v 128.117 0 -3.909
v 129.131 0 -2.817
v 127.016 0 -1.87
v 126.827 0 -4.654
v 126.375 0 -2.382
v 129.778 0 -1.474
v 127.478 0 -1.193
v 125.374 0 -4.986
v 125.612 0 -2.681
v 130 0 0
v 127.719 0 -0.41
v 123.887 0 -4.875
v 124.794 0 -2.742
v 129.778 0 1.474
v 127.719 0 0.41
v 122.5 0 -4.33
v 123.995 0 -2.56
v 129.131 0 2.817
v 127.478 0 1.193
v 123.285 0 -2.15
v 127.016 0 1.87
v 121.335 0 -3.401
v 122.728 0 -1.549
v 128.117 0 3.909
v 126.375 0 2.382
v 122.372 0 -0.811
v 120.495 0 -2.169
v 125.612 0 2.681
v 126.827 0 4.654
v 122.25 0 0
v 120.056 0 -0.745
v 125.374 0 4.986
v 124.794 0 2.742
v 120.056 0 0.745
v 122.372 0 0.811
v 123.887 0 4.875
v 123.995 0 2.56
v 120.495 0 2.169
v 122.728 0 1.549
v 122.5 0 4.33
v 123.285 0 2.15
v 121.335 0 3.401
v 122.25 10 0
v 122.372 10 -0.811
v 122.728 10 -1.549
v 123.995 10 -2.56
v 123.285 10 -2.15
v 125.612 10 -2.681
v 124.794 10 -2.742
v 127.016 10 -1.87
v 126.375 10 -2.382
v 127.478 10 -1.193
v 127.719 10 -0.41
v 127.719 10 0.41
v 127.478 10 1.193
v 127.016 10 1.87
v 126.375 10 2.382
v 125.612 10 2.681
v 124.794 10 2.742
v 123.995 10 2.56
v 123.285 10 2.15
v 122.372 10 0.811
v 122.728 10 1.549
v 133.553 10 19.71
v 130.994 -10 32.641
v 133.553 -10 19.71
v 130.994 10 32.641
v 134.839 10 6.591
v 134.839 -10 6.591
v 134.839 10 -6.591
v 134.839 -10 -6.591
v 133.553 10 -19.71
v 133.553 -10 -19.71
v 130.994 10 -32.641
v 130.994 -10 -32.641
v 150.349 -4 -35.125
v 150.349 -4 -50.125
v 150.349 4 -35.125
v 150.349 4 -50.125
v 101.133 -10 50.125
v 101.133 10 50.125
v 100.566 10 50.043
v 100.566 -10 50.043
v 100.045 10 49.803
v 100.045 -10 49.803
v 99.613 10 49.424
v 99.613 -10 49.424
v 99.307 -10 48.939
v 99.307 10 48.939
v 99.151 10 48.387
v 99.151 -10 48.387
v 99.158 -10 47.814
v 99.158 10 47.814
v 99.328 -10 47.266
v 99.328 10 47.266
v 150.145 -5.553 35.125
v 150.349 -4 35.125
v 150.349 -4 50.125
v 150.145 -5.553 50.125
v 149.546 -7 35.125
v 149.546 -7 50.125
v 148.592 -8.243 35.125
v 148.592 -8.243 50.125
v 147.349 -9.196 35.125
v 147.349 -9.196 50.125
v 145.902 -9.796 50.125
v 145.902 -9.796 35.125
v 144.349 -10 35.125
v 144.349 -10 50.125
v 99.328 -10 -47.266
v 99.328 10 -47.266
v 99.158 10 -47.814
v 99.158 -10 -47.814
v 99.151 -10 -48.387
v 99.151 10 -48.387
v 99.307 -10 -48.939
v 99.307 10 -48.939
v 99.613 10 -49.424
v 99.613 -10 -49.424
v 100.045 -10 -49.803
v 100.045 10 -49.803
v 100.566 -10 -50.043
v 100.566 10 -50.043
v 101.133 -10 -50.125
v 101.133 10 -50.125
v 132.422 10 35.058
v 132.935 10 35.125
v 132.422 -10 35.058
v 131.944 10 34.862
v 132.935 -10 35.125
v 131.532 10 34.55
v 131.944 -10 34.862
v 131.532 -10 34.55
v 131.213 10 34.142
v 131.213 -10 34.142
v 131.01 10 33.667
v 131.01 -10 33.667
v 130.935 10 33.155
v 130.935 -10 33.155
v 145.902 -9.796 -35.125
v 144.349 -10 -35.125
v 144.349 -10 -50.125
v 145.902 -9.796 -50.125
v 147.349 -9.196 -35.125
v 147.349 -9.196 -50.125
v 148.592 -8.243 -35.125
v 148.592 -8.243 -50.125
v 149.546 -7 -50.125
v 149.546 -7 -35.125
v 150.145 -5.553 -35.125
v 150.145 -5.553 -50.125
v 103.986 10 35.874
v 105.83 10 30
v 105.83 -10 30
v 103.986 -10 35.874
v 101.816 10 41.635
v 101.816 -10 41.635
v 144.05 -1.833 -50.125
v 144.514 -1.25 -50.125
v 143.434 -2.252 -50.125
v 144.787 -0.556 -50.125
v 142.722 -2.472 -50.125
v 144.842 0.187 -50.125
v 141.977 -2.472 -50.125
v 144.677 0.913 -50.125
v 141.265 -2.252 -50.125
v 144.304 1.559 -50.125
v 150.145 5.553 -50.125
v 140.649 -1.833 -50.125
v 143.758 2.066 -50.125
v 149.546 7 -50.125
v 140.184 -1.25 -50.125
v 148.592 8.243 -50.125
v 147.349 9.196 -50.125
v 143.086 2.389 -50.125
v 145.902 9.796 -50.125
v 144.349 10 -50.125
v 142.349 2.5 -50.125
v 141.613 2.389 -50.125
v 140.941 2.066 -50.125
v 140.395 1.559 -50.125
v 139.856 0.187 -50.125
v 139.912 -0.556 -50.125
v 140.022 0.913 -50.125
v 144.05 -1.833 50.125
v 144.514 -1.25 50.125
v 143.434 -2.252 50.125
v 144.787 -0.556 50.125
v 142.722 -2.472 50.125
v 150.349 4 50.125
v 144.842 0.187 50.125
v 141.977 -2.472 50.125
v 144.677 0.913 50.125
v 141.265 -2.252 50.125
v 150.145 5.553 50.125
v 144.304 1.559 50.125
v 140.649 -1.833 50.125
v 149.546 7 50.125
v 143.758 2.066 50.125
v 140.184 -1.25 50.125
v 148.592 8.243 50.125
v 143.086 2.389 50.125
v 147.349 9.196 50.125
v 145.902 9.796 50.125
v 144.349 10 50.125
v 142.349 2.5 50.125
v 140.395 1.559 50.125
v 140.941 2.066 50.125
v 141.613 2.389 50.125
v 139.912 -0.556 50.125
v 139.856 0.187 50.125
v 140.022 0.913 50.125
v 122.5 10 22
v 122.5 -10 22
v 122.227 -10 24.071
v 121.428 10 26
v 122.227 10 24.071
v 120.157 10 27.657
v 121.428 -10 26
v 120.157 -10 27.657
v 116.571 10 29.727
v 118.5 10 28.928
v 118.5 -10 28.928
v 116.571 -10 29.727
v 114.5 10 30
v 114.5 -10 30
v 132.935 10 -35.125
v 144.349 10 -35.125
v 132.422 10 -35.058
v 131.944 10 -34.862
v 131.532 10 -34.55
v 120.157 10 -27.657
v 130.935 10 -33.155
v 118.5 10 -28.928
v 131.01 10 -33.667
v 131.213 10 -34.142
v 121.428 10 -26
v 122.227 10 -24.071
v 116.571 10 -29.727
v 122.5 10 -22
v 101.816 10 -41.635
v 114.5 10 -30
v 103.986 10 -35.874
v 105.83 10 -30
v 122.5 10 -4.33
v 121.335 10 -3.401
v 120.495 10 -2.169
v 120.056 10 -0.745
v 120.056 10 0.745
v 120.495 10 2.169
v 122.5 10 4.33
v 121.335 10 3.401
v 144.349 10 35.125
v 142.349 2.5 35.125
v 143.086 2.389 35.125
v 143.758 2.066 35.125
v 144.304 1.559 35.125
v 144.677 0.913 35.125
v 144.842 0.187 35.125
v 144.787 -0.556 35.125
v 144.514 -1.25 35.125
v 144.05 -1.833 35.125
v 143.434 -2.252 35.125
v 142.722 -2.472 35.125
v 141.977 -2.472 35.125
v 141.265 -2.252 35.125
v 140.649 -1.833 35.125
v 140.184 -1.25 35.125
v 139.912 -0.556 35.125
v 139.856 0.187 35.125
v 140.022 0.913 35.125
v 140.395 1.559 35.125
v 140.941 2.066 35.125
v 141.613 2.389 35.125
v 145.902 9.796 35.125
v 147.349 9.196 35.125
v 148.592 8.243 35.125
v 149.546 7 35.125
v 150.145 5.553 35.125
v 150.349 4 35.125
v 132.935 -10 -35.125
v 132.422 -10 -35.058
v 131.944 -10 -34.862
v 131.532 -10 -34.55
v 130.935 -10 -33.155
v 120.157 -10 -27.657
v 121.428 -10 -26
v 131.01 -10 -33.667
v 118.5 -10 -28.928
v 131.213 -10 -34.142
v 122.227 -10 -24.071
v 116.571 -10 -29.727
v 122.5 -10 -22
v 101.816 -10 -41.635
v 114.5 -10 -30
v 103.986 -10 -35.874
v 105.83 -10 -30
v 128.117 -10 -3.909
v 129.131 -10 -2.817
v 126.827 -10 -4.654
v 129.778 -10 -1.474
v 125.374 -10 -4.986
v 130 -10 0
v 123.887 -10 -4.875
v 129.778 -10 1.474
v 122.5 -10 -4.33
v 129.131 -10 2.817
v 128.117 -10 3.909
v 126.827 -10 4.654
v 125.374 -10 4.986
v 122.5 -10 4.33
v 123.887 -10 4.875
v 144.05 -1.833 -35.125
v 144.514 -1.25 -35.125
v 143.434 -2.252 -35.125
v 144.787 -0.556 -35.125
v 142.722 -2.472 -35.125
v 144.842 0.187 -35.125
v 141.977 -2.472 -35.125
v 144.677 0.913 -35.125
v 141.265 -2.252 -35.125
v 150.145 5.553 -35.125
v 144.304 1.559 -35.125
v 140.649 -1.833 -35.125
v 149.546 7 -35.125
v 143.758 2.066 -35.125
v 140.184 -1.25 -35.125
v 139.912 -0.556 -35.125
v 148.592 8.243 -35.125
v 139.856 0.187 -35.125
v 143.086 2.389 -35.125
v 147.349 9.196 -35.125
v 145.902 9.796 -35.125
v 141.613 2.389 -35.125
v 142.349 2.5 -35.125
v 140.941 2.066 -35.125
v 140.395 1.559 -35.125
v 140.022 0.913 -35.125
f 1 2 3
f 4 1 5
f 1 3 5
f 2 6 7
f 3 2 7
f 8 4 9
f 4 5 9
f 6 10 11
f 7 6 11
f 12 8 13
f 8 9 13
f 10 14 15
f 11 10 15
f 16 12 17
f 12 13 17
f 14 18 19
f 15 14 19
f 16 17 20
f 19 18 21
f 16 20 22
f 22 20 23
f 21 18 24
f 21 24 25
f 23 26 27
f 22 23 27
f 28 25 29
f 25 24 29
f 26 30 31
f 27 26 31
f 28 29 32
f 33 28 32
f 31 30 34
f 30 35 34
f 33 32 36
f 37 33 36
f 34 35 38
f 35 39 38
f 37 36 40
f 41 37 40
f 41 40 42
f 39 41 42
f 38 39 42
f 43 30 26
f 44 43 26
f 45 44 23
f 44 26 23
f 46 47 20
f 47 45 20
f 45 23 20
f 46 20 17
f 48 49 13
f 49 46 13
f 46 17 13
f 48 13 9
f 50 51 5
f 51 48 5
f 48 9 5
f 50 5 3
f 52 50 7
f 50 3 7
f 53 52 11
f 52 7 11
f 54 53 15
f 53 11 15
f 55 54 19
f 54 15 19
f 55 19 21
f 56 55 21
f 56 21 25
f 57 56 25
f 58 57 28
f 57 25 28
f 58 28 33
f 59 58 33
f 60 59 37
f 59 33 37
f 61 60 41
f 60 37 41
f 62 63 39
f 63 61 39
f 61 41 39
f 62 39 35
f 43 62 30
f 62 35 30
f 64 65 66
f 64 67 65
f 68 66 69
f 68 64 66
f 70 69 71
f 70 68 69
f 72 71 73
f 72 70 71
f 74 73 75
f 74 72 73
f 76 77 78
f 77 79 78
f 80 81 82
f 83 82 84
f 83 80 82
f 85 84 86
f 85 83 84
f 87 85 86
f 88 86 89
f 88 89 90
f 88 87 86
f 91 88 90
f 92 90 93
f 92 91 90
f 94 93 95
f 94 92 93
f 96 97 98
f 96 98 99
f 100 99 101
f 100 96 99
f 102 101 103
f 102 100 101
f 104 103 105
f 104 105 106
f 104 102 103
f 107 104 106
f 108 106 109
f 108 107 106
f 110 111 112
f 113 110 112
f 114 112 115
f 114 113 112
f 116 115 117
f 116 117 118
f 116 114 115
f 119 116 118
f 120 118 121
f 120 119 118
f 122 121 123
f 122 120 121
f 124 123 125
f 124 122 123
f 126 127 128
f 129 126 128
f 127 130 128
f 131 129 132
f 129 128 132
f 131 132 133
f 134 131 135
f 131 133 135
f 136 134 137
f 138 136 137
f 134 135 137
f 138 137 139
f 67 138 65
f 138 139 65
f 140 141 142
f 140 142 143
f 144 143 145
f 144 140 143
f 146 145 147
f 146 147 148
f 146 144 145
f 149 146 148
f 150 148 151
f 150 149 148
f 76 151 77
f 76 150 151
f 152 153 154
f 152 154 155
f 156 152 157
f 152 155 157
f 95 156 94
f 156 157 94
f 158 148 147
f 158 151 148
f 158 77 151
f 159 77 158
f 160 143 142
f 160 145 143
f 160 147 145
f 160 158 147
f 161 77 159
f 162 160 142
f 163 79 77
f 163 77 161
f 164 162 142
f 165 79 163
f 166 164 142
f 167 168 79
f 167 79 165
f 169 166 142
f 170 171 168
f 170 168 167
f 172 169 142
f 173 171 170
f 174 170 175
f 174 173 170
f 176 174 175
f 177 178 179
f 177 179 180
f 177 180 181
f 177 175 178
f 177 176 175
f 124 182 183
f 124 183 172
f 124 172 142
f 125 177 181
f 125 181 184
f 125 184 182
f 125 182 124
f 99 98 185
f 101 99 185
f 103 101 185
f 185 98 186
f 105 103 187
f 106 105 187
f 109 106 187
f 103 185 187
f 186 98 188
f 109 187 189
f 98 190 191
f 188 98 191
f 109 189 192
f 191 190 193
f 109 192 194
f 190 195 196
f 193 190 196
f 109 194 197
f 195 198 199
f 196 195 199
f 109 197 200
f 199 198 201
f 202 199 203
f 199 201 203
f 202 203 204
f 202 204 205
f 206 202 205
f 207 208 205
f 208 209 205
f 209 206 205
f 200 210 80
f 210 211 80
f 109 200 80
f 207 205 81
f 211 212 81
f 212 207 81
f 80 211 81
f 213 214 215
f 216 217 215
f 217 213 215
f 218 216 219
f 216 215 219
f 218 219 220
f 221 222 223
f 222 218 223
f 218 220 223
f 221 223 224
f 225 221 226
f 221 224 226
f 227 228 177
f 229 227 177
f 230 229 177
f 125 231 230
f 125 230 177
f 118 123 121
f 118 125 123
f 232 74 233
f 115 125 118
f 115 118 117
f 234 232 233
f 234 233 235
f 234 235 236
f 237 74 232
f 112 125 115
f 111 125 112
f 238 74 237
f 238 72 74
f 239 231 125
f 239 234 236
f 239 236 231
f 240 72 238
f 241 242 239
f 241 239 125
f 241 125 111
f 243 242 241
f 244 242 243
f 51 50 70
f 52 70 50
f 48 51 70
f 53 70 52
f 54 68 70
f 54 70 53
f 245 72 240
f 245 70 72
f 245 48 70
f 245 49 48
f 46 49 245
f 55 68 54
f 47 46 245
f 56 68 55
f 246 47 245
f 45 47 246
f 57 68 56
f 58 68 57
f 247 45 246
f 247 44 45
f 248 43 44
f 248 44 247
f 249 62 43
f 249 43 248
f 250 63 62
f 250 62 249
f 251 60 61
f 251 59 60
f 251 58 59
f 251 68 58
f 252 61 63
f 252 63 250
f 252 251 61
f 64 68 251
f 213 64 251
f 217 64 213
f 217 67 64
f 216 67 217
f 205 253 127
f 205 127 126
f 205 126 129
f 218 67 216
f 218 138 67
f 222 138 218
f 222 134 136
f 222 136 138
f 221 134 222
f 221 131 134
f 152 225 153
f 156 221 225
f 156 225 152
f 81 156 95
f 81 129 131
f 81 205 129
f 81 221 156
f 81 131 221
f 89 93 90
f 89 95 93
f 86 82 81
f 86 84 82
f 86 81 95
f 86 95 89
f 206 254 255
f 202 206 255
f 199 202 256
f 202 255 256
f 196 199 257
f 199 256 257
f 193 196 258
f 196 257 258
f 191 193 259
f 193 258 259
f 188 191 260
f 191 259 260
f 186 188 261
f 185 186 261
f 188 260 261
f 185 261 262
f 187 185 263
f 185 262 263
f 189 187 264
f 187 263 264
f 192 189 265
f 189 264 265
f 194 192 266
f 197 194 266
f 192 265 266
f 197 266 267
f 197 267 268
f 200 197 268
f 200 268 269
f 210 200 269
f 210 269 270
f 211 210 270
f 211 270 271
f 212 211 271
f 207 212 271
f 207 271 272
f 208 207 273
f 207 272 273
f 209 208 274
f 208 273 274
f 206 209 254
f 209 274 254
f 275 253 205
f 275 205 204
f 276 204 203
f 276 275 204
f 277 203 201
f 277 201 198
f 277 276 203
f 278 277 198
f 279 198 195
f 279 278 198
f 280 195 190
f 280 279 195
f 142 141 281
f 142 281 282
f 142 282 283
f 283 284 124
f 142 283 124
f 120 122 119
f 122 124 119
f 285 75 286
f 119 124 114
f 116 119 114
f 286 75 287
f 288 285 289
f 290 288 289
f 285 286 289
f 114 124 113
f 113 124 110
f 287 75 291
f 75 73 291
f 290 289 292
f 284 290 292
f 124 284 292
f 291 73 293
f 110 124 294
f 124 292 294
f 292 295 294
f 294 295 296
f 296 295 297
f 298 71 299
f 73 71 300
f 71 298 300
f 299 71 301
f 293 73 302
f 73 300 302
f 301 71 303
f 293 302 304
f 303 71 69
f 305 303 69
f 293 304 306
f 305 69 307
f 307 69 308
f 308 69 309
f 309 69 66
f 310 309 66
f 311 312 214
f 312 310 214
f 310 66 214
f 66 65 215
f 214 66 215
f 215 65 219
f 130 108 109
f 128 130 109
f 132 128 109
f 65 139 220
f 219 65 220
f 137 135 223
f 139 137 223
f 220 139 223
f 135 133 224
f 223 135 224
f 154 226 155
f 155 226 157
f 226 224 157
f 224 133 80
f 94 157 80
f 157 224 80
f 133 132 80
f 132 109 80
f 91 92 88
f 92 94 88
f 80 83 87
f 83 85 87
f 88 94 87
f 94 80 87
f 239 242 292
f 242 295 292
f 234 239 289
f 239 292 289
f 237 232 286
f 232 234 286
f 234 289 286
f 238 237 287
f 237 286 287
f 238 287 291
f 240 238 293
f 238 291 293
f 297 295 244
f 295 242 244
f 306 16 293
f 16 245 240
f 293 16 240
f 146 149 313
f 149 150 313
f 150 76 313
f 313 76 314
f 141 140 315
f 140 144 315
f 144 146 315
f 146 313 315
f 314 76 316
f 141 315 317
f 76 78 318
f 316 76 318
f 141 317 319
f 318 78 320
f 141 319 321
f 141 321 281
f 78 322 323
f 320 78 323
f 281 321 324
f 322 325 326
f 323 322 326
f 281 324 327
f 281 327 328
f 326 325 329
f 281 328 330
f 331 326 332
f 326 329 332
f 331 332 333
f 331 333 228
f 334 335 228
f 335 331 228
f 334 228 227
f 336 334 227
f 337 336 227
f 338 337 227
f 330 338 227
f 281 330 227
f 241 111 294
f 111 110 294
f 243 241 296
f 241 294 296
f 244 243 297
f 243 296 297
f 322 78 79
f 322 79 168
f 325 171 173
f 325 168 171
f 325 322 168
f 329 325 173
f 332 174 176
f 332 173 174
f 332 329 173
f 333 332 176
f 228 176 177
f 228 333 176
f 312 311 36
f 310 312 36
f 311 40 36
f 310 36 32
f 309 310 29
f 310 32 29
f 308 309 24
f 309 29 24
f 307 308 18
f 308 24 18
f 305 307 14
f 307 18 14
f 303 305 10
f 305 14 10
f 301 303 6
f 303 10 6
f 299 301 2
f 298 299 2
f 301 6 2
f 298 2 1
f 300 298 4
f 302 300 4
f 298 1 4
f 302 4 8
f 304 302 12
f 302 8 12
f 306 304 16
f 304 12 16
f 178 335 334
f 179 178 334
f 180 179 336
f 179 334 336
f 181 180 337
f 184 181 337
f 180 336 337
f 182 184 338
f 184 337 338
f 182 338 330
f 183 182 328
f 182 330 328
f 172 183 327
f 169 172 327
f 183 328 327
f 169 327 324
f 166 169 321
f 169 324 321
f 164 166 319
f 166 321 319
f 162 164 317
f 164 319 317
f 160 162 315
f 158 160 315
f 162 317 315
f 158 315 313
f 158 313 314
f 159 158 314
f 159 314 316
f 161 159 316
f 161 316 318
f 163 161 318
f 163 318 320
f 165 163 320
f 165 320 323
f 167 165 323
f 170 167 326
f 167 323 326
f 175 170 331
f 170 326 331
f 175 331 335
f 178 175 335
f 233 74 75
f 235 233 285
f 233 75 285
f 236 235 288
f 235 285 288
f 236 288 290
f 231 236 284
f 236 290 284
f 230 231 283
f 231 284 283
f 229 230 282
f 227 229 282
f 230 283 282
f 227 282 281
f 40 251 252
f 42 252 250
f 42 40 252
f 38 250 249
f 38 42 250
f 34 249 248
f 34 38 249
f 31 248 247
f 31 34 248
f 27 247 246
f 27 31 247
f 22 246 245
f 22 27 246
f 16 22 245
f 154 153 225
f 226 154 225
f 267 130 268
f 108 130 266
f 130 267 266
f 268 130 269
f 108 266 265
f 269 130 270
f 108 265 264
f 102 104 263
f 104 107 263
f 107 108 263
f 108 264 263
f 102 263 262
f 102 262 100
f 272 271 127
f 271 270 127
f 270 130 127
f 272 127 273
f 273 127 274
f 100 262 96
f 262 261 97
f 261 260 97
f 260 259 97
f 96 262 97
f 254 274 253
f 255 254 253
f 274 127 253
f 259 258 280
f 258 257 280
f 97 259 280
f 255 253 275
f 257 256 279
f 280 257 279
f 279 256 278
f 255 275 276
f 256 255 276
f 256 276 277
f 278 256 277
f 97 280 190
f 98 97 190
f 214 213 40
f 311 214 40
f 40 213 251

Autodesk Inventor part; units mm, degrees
ref_plane "YZ Plane" through (0, 0, 0) normal (1, 0, 0) x (0, 1, 0)
ref_plane "XZ Plane" through (0, 0, 0) normal (0, 1, 0) x (-1, 0, 0)
ref_plane "XY Plane" through (0, 0, 0) normal (0, 0, 1) x (1, 0, 0)
sketch "Sketch1" plane through (0, 0, 0) normal (0, 1, 0) x (-1, 0, 0)
  circle A0 centre (0, 0) radius 135
  circle A1 centre (0, 0) radius 110
  line L0 (0, 0) -> (-125, 0)
  line L1 (0, 0) -> (125, 0) construction
  circle A2 centre (-125, 0) radius 2.75
  circle A3 centre (-125, 0) radius 5
  dimension "d0" = 270
  dimension "d1" = 220
  dimension "d82" = 125
  dimension "d83" = 180
  dimension "d84" = 5.5
  dimension "d85" = 10
extrude "Extrusion1" add sketch "Sketch1" along normal mid plane 20 contours A0 | A2 | A3
sketch "Sketch4" plane through (0, 10, 0) normal (0, 1, 0) x (1, 0, 0)
  circle A0 centre (0, 0) radius 50.125
  circle A1 centre (0, 0) radius 135 projected
  circle A2 centre (0, 0) radius 110 projected
  line L0 (125.3494, 50.125) -> (150.3494, 50.125)
  line L1 (150.3494, 50.125) -> (150.3494, 35.125)
  line L2 (150.3494, 35.125) -> (125.3494, 35.125)
  line L3 (125.3494, 35.125) -> (125.3494, 50.125)
  line L4 (150.3494, 70.125) -> (104.7795, 70.125)
  line L5 (104.7795, 70.125) -> (104.7795, 85.125)
  line L6 (104.7795, 85.125) -> (150.3494, 85.125)
  line L7 (150.3494, 85.125) -> (150.3494, 70.125)
  line L8 (103.1497, 60.125) -> (138.3886, 60.125) construction
  point P0 (130.3504, 35.125)
  point P1 (115.3581, 70.125)
  dimension "d21" = 100.25
  dimension "d22" = 25
  dimension "d23" = 15
  dimension "d24" = 20
  dimension "d25" = 15
  dimension "d57" = 10
extrude "Extrusion3" add sketch "Sketch4" against normal up to surface (20 mm away) contours L6 L7 L4 A1 | A1 L0 L1 L2
fillet "Fillet1" radius 6 4 edges at (150.3494, 10, -77.625) (150.3494, -10, -77.625) (150.3494, -10, -42.625) (150.3494, 10, -42.625)
fillet "Fillet2" radius 10 1 edges at (104.7795, 0, -85.125)
fillet "Fillet3" radius 2 1 edges at (130.3504, 0, -35.125)
sketch "Sketch5" plane through (150.3494, -4, -85.125) normal (0, 0, -1) x (-1, 0, 0)
  line L0 (0, 8) -> (0, 0) projected
  line L1 (40.9135, -6) -> (6, -6) projected
  point P0 (150.3494, 4)
  point P1 (8, 4)
  point P2 (0, 4)
  dimension "d38" = 8
  dimension "d39" = 10
hole "Hole2" at (142.3494, 0, -85.125) direction (0, 0, 1) diameter 5 depth 50 counterbore diameter 8.5 counterbore depth 5
mirror "Mirror1" about plane through (0, 0, 0) normal (1, 0, 0) of "Extrusion3", "Fillet1", "Fillet2", "Fillet3", "Hole2"
mirror "Mirror2" about plane through (0, 0, 0) normal (0, 0, 1) of "Extrusion3", "Fillet1", "Fillet2", "Fillet3", "Hole2"
sketch "Sketch10" plane through (0, 10, 0) normal (0, 1, 0) x (1, 0, 0)
  line L0 (144.3494, 50.125) -> (125.3494, 50.125) projected
  line L1 (144.3494, -50.125) -> (125.3494, -50.125) projected
  line L2 (174.7146, 50.125) -> (75.699, 50.125)
  line L3 (75.699, 50.125) -> (75.699, -50.125)
  line L4 (75.699, -50.125) -> (174.7146, -50.125)
  line L5 (174.7146, 145.3293) -> (-157.7861, 145.3293)
  line L6 (-157.7861, 145.3293) -> (-157.7861, -141.1771)
  line L7 (-157.7861, -141.1771) -> (174.7146, -141.1771)
  line L8 (174.7146, -141.1771) -> (174.7146, -50.125)
  line L9 (174.7146, 50.125) -> (174.7146, 145.3293)
  point P0 (0, 0)
extrude "Extrusion7" cut sketch "Sketch10" against normal through all
fillet "Fillet7" radius 2 2 edges at (97.9157, 0, -50.125) (97.9157, 0, 50.125)
sketch "Sketch12" plane through (0, 10, 0) normal (0, 1, 0) x (1, 0, 0)
  circle A0 centre (0, 0) radius 110
  line L0 (122.5, 30) -> (97.5, 30)
  line L1 (97.5, 30) -> (97.5, -30)
  line L2 (97.5, -30) -> (122.5, -30)
  line L3 (122.5, -30) -> (122.5, 30)
  line L4 (122.5, 30) -> (97.5, -30) construction
  line L5 (97.5, 30) -> (122.5, -30) construction
  point P0 (110, 0)
  dimension "d68" = 25
  dimension "d69" = 60
extrude "Extrusion9" cut sketch "Sketch12" against normal up to surface (20 mm away) contours A0 L2 L1 L0 | A0 L0 L3 L2 picked at (101.6667, 0)
fillet "Fillet8" radius 8 2 edges at (122.5, 0, -30) (122.5, 0, 30)
extrude "Extrusion10" cut sketch "Sketch1" along normal mid plane 20 contours A2 | A3
extrude "Extrusion11" add sketch "Sketch1" along normal up to surface (10 mm away) contours A3
properties part number "Cylinder 80-20 Spacer_1 Slant"
